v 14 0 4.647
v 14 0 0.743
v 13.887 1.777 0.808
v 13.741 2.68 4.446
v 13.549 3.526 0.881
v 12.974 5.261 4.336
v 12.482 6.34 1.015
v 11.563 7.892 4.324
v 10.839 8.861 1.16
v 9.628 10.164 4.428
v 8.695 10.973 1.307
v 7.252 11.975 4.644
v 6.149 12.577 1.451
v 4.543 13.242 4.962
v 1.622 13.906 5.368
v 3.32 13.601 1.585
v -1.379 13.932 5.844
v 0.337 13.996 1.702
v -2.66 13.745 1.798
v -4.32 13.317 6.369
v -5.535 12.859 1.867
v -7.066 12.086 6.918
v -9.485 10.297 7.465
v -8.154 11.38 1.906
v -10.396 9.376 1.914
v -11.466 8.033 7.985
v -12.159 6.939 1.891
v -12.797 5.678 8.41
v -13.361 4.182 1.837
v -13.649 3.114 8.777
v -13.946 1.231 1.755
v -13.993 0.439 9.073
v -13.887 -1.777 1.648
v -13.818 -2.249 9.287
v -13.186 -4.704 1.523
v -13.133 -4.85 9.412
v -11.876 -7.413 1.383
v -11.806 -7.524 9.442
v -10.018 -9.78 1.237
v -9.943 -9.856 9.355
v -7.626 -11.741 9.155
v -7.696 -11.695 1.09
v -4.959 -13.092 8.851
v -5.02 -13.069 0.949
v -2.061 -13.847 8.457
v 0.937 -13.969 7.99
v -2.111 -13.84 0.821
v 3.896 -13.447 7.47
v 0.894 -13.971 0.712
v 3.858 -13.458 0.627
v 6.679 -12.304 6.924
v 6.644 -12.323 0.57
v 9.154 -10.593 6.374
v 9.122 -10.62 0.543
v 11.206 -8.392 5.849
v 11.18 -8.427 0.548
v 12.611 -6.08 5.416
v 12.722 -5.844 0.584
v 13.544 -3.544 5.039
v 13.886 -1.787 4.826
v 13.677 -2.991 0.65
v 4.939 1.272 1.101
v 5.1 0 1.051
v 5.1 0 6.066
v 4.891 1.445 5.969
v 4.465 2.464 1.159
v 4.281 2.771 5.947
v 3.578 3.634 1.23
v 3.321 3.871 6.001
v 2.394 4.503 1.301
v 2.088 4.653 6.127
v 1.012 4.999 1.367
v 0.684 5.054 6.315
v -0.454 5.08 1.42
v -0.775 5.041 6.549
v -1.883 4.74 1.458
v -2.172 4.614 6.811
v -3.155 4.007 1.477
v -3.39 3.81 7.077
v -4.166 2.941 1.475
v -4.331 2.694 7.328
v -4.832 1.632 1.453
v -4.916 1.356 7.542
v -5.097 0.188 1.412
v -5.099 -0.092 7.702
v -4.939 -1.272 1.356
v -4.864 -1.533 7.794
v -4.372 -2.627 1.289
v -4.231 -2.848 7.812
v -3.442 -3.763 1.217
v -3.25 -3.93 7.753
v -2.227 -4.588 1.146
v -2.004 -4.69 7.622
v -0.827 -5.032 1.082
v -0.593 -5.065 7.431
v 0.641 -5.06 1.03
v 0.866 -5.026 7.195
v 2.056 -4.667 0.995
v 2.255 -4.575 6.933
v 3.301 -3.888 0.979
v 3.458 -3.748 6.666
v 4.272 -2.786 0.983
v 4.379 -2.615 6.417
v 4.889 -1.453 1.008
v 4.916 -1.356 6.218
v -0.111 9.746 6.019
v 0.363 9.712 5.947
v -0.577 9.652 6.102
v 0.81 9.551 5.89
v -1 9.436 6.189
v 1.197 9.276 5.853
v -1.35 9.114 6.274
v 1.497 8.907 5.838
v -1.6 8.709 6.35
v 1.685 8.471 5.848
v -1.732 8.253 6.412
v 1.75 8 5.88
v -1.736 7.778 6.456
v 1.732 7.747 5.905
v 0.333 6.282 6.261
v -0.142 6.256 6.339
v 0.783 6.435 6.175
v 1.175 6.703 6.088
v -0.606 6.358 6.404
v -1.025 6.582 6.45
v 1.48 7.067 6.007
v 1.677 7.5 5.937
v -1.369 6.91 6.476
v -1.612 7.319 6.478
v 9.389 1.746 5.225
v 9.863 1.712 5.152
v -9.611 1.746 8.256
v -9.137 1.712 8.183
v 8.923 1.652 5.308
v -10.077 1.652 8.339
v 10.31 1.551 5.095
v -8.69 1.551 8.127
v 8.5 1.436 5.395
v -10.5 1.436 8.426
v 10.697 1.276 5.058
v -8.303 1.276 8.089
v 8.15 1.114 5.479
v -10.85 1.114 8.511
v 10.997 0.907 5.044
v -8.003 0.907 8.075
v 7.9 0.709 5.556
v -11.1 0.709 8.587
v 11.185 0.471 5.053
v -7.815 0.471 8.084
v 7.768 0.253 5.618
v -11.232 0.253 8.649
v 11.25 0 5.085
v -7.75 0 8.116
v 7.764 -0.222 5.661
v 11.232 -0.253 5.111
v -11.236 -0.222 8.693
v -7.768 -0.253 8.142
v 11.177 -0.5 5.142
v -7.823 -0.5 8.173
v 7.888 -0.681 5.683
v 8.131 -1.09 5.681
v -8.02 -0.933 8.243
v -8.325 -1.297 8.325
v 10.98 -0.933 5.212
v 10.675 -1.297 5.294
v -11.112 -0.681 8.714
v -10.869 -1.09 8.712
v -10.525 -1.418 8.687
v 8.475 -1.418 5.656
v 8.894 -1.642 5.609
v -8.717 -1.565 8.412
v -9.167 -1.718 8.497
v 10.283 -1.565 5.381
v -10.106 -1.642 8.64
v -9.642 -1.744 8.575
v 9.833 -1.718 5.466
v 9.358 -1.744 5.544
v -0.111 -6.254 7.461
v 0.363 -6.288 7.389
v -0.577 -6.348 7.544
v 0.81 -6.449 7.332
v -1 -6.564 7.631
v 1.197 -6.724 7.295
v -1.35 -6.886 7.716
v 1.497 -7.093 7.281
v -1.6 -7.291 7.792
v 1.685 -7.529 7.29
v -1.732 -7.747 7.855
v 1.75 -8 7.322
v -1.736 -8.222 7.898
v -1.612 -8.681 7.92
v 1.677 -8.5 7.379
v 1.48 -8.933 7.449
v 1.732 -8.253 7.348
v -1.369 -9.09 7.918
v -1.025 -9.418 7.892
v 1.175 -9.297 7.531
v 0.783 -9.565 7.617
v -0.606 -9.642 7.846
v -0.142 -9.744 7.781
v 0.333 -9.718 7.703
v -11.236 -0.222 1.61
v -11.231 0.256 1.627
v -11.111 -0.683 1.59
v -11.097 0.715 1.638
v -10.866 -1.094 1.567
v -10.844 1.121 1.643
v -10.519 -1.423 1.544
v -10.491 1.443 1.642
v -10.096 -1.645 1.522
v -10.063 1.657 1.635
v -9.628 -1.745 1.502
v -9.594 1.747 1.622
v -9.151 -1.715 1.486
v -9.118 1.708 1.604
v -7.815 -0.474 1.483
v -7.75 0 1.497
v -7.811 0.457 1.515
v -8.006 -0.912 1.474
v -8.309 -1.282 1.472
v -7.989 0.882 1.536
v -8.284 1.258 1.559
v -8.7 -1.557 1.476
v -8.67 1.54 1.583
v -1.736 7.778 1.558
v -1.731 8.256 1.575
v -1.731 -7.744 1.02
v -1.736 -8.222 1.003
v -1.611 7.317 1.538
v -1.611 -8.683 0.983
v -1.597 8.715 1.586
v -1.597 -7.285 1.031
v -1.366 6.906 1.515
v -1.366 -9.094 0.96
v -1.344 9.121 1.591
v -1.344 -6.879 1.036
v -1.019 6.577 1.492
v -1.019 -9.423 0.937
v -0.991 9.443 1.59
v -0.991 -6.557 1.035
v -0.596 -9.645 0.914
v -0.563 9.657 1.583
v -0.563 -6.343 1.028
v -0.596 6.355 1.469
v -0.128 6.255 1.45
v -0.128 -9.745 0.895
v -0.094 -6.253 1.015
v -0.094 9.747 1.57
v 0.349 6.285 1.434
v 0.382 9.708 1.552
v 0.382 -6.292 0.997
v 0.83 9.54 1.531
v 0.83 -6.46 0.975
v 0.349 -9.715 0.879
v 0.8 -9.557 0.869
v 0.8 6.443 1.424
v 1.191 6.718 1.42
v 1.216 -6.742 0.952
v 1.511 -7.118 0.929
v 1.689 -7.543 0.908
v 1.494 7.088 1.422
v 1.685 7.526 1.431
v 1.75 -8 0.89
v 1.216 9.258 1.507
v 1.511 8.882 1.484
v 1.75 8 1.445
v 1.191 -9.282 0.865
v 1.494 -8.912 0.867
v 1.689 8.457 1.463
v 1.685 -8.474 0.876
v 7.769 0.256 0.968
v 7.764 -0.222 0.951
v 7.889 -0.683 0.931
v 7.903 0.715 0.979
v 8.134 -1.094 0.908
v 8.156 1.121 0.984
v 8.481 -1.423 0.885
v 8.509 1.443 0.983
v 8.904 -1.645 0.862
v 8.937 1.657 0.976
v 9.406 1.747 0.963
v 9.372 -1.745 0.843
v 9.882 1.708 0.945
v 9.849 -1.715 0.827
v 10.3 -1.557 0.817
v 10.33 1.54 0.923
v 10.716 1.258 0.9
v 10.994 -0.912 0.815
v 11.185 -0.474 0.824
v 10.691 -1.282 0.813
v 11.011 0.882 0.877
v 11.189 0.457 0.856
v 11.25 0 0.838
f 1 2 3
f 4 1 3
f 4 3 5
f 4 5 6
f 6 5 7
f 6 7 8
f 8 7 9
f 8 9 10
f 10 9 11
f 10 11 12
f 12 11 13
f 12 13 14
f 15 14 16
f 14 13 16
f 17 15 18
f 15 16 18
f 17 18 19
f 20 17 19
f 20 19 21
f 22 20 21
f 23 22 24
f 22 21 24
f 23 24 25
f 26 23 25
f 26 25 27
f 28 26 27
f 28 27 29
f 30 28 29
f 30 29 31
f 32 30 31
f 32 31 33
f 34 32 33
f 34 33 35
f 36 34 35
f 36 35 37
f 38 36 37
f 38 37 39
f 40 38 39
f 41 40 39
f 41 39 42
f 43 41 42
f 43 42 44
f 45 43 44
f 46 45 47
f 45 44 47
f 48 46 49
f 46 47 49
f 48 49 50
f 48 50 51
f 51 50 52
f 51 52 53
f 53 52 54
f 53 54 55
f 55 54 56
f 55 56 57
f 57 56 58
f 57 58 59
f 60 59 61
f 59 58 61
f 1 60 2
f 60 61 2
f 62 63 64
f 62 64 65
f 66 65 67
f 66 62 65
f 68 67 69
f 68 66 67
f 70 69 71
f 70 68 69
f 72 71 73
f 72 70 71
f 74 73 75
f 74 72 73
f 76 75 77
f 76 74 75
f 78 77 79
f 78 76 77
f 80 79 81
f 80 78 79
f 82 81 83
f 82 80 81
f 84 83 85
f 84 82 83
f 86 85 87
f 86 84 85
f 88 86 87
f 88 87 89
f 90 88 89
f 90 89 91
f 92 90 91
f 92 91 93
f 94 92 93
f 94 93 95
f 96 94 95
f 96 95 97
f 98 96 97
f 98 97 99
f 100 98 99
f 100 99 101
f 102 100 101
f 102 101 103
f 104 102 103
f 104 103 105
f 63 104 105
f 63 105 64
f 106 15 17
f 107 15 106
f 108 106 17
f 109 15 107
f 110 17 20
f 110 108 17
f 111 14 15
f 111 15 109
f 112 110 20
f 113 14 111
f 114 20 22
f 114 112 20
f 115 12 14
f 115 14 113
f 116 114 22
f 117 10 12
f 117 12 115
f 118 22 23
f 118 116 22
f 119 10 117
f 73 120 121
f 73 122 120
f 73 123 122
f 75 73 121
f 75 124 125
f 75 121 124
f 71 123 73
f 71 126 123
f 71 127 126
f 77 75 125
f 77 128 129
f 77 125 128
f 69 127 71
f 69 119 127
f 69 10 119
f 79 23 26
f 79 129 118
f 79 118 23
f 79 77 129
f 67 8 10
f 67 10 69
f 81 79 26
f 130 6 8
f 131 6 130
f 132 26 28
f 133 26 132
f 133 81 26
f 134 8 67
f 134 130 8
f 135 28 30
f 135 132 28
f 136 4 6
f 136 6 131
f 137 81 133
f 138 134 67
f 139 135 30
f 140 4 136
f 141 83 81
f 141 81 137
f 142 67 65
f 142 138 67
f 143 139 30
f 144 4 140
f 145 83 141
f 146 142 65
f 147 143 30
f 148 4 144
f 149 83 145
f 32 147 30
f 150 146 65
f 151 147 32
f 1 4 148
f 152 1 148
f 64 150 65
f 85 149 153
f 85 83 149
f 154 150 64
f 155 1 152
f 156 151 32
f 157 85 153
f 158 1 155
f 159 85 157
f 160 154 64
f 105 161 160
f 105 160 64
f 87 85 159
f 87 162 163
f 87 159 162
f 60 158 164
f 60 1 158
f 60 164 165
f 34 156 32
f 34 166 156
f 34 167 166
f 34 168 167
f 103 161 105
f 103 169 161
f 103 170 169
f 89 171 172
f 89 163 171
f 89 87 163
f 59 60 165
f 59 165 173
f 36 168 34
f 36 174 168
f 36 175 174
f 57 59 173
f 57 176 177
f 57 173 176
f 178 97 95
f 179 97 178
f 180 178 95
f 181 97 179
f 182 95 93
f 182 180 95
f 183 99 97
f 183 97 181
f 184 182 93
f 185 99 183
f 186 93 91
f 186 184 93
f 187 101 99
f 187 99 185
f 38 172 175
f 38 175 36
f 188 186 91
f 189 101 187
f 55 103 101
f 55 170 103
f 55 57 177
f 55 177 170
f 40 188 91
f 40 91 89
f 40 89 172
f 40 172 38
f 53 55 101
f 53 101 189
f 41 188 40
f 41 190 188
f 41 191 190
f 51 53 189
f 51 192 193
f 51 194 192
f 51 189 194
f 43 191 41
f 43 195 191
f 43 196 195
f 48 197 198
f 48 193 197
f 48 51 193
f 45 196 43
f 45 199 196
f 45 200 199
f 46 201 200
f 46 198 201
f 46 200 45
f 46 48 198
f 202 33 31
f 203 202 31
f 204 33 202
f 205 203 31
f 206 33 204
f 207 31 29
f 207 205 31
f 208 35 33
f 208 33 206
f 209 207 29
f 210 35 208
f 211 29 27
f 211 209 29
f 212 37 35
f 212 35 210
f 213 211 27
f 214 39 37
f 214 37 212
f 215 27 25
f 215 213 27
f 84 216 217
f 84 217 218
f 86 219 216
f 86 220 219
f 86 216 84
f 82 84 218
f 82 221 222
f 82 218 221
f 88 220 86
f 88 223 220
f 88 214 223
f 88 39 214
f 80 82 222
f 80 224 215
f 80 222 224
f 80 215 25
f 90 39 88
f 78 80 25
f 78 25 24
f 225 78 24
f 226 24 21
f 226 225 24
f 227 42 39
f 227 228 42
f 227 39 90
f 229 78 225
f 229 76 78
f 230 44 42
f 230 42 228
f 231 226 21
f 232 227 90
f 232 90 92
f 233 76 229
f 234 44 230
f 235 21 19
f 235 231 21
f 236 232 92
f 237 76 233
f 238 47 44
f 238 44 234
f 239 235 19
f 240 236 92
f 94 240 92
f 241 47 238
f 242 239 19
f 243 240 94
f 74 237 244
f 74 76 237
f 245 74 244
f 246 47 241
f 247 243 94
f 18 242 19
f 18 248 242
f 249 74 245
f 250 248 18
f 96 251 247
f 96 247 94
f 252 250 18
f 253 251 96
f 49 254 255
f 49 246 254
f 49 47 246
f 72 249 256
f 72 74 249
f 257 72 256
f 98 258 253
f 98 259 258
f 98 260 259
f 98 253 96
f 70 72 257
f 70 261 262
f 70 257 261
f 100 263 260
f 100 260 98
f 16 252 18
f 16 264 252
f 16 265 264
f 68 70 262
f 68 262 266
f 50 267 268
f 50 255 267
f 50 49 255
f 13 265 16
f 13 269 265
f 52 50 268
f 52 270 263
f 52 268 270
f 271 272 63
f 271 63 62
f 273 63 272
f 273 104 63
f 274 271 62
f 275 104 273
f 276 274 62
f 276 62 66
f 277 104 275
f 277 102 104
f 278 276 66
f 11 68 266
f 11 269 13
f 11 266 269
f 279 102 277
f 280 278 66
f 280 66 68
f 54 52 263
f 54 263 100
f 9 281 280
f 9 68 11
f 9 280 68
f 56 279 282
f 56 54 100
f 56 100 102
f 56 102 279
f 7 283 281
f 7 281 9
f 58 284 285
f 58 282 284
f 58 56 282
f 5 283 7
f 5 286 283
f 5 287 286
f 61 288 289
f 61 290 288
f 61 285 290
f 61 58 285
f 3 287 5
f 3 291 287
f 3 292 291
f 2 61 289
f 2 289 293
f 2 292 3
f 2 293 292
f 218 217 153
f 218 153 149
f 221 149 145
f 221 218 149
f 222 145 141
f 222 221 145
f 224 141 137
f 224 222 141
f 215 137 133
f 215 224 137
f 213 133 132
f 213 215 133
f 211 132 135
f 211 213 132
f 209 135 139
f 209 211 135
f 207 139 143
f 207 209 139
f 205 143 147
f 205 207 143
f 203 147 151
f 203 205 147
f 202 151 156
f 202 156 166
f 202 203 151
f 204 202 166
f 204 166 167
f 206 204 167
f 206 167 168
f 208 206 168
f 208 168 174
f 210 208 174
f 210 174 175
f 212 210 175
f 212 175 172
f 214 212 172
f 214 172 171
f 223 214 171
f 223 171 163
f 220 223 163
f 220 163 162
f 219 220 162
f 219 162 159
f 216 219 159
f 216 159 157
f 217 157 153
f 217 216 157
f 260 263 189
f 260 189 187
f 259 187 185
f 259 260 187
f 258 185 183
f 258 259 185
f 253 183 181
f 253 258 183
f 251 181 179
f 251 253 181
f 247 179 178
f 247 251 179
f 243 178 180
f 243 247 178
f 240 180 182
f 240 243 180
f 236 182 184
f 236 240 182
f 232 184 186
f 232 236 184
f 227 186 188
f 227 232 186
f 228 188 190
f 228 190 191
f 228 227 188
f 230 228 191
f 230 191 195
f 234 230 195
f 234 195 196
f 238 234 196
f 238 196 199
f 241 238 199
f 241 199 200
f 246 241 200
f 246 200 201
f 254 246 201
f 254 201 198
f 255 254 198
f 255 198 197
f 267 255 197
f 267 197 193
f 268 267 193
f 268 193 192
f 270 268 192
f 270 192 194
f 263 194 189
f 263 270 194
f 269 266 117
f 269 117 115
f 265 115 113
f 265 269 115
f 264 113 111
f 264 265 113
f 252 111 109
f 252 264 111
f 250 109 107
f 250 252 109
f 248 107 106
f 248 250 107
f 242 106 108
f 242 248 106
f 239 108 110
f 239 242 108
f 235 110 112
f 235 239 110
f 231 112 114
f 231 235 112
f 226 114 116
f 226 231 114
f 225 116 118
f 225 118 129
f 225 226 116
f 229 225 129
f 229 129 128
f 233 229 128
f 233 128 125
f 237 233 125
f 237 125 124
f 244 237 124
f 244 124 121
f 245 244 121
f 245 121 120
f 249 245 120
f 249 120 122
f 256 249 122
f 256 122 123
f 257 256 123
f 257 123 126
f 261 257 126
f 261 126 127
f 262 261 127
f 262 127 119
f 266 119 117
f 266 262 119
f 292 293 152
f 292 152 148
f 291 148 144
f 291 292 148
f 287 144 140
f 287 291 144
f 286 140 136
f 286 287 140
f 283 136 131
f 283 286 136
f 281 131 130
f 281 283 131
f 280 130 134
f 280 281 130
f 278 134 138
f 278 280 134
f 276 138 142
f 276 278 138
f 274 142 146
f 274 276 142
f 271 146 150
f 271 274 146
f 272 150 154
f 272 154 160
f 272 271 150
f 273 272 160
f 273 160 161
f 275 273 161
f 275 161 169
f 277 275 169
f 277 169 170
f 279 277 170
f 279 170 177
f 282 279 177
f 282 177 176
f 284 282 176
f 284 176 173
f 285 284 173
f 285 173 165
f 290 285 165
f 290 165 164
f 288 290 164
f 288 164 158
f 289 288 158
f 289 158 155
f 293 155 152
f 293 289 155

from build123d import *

# Parameters (mm, degrees)
F0_R     = 14
F0_R_2   = 1.75
F0_R_3   = 5.1
F1_DEPTH = 10
F6_DEPTH = 40


with BuildPart() as f1:
    # F0 (on Top) → F1 (new body)
    with BuildSketch(Plane.XY):
        Circle(F0_R)
        with Locations((0, -8)):
            Circle(F0_R_2, mode=Mode.SUBTRACT)
        with Locations((-9.5, 0)):
            Circle(F0_R_2, mode=Mode.SUBTRACT)
        Circle(F0_R_3, mode=Mode.SUBTRACT)
        with Locations((9.5, 0)):
            Circle(F0_R_2, mode=Mode.SUBTRACT)
        with Locations((0, 8)):
            Circle(F0_R_2, mode=Mode.SUBTRACT)
    extrude(amount=F1_DEPTH)

    # F5 (on face) → F6 (intersect)
    with BuildSketch(Plane(origin=(17.6564226245, -17.6564226245, -1.2253490154), x_dir=(0.7045622489, 0.7079556371, -0.0488963521), z_dir=(0.706256905, -0.706256905, -0.0490139606))):
        Polygon((-42.1593469174, 12.1424701935), (-41.5246425416, -0.8069908946), (14.9219552549, 1.9596804268), (14.7750896798, 4.9560833541), align=None)
        Polygon((14.7750896798, 4.9560833541), (14.9219552549, 1.9596804268), (31.9154007009, 2.7925964926), align=None)
    extrude(amount=-F6_DEPTH, mode=Mode.INTERSECT)


solid = f1.part
